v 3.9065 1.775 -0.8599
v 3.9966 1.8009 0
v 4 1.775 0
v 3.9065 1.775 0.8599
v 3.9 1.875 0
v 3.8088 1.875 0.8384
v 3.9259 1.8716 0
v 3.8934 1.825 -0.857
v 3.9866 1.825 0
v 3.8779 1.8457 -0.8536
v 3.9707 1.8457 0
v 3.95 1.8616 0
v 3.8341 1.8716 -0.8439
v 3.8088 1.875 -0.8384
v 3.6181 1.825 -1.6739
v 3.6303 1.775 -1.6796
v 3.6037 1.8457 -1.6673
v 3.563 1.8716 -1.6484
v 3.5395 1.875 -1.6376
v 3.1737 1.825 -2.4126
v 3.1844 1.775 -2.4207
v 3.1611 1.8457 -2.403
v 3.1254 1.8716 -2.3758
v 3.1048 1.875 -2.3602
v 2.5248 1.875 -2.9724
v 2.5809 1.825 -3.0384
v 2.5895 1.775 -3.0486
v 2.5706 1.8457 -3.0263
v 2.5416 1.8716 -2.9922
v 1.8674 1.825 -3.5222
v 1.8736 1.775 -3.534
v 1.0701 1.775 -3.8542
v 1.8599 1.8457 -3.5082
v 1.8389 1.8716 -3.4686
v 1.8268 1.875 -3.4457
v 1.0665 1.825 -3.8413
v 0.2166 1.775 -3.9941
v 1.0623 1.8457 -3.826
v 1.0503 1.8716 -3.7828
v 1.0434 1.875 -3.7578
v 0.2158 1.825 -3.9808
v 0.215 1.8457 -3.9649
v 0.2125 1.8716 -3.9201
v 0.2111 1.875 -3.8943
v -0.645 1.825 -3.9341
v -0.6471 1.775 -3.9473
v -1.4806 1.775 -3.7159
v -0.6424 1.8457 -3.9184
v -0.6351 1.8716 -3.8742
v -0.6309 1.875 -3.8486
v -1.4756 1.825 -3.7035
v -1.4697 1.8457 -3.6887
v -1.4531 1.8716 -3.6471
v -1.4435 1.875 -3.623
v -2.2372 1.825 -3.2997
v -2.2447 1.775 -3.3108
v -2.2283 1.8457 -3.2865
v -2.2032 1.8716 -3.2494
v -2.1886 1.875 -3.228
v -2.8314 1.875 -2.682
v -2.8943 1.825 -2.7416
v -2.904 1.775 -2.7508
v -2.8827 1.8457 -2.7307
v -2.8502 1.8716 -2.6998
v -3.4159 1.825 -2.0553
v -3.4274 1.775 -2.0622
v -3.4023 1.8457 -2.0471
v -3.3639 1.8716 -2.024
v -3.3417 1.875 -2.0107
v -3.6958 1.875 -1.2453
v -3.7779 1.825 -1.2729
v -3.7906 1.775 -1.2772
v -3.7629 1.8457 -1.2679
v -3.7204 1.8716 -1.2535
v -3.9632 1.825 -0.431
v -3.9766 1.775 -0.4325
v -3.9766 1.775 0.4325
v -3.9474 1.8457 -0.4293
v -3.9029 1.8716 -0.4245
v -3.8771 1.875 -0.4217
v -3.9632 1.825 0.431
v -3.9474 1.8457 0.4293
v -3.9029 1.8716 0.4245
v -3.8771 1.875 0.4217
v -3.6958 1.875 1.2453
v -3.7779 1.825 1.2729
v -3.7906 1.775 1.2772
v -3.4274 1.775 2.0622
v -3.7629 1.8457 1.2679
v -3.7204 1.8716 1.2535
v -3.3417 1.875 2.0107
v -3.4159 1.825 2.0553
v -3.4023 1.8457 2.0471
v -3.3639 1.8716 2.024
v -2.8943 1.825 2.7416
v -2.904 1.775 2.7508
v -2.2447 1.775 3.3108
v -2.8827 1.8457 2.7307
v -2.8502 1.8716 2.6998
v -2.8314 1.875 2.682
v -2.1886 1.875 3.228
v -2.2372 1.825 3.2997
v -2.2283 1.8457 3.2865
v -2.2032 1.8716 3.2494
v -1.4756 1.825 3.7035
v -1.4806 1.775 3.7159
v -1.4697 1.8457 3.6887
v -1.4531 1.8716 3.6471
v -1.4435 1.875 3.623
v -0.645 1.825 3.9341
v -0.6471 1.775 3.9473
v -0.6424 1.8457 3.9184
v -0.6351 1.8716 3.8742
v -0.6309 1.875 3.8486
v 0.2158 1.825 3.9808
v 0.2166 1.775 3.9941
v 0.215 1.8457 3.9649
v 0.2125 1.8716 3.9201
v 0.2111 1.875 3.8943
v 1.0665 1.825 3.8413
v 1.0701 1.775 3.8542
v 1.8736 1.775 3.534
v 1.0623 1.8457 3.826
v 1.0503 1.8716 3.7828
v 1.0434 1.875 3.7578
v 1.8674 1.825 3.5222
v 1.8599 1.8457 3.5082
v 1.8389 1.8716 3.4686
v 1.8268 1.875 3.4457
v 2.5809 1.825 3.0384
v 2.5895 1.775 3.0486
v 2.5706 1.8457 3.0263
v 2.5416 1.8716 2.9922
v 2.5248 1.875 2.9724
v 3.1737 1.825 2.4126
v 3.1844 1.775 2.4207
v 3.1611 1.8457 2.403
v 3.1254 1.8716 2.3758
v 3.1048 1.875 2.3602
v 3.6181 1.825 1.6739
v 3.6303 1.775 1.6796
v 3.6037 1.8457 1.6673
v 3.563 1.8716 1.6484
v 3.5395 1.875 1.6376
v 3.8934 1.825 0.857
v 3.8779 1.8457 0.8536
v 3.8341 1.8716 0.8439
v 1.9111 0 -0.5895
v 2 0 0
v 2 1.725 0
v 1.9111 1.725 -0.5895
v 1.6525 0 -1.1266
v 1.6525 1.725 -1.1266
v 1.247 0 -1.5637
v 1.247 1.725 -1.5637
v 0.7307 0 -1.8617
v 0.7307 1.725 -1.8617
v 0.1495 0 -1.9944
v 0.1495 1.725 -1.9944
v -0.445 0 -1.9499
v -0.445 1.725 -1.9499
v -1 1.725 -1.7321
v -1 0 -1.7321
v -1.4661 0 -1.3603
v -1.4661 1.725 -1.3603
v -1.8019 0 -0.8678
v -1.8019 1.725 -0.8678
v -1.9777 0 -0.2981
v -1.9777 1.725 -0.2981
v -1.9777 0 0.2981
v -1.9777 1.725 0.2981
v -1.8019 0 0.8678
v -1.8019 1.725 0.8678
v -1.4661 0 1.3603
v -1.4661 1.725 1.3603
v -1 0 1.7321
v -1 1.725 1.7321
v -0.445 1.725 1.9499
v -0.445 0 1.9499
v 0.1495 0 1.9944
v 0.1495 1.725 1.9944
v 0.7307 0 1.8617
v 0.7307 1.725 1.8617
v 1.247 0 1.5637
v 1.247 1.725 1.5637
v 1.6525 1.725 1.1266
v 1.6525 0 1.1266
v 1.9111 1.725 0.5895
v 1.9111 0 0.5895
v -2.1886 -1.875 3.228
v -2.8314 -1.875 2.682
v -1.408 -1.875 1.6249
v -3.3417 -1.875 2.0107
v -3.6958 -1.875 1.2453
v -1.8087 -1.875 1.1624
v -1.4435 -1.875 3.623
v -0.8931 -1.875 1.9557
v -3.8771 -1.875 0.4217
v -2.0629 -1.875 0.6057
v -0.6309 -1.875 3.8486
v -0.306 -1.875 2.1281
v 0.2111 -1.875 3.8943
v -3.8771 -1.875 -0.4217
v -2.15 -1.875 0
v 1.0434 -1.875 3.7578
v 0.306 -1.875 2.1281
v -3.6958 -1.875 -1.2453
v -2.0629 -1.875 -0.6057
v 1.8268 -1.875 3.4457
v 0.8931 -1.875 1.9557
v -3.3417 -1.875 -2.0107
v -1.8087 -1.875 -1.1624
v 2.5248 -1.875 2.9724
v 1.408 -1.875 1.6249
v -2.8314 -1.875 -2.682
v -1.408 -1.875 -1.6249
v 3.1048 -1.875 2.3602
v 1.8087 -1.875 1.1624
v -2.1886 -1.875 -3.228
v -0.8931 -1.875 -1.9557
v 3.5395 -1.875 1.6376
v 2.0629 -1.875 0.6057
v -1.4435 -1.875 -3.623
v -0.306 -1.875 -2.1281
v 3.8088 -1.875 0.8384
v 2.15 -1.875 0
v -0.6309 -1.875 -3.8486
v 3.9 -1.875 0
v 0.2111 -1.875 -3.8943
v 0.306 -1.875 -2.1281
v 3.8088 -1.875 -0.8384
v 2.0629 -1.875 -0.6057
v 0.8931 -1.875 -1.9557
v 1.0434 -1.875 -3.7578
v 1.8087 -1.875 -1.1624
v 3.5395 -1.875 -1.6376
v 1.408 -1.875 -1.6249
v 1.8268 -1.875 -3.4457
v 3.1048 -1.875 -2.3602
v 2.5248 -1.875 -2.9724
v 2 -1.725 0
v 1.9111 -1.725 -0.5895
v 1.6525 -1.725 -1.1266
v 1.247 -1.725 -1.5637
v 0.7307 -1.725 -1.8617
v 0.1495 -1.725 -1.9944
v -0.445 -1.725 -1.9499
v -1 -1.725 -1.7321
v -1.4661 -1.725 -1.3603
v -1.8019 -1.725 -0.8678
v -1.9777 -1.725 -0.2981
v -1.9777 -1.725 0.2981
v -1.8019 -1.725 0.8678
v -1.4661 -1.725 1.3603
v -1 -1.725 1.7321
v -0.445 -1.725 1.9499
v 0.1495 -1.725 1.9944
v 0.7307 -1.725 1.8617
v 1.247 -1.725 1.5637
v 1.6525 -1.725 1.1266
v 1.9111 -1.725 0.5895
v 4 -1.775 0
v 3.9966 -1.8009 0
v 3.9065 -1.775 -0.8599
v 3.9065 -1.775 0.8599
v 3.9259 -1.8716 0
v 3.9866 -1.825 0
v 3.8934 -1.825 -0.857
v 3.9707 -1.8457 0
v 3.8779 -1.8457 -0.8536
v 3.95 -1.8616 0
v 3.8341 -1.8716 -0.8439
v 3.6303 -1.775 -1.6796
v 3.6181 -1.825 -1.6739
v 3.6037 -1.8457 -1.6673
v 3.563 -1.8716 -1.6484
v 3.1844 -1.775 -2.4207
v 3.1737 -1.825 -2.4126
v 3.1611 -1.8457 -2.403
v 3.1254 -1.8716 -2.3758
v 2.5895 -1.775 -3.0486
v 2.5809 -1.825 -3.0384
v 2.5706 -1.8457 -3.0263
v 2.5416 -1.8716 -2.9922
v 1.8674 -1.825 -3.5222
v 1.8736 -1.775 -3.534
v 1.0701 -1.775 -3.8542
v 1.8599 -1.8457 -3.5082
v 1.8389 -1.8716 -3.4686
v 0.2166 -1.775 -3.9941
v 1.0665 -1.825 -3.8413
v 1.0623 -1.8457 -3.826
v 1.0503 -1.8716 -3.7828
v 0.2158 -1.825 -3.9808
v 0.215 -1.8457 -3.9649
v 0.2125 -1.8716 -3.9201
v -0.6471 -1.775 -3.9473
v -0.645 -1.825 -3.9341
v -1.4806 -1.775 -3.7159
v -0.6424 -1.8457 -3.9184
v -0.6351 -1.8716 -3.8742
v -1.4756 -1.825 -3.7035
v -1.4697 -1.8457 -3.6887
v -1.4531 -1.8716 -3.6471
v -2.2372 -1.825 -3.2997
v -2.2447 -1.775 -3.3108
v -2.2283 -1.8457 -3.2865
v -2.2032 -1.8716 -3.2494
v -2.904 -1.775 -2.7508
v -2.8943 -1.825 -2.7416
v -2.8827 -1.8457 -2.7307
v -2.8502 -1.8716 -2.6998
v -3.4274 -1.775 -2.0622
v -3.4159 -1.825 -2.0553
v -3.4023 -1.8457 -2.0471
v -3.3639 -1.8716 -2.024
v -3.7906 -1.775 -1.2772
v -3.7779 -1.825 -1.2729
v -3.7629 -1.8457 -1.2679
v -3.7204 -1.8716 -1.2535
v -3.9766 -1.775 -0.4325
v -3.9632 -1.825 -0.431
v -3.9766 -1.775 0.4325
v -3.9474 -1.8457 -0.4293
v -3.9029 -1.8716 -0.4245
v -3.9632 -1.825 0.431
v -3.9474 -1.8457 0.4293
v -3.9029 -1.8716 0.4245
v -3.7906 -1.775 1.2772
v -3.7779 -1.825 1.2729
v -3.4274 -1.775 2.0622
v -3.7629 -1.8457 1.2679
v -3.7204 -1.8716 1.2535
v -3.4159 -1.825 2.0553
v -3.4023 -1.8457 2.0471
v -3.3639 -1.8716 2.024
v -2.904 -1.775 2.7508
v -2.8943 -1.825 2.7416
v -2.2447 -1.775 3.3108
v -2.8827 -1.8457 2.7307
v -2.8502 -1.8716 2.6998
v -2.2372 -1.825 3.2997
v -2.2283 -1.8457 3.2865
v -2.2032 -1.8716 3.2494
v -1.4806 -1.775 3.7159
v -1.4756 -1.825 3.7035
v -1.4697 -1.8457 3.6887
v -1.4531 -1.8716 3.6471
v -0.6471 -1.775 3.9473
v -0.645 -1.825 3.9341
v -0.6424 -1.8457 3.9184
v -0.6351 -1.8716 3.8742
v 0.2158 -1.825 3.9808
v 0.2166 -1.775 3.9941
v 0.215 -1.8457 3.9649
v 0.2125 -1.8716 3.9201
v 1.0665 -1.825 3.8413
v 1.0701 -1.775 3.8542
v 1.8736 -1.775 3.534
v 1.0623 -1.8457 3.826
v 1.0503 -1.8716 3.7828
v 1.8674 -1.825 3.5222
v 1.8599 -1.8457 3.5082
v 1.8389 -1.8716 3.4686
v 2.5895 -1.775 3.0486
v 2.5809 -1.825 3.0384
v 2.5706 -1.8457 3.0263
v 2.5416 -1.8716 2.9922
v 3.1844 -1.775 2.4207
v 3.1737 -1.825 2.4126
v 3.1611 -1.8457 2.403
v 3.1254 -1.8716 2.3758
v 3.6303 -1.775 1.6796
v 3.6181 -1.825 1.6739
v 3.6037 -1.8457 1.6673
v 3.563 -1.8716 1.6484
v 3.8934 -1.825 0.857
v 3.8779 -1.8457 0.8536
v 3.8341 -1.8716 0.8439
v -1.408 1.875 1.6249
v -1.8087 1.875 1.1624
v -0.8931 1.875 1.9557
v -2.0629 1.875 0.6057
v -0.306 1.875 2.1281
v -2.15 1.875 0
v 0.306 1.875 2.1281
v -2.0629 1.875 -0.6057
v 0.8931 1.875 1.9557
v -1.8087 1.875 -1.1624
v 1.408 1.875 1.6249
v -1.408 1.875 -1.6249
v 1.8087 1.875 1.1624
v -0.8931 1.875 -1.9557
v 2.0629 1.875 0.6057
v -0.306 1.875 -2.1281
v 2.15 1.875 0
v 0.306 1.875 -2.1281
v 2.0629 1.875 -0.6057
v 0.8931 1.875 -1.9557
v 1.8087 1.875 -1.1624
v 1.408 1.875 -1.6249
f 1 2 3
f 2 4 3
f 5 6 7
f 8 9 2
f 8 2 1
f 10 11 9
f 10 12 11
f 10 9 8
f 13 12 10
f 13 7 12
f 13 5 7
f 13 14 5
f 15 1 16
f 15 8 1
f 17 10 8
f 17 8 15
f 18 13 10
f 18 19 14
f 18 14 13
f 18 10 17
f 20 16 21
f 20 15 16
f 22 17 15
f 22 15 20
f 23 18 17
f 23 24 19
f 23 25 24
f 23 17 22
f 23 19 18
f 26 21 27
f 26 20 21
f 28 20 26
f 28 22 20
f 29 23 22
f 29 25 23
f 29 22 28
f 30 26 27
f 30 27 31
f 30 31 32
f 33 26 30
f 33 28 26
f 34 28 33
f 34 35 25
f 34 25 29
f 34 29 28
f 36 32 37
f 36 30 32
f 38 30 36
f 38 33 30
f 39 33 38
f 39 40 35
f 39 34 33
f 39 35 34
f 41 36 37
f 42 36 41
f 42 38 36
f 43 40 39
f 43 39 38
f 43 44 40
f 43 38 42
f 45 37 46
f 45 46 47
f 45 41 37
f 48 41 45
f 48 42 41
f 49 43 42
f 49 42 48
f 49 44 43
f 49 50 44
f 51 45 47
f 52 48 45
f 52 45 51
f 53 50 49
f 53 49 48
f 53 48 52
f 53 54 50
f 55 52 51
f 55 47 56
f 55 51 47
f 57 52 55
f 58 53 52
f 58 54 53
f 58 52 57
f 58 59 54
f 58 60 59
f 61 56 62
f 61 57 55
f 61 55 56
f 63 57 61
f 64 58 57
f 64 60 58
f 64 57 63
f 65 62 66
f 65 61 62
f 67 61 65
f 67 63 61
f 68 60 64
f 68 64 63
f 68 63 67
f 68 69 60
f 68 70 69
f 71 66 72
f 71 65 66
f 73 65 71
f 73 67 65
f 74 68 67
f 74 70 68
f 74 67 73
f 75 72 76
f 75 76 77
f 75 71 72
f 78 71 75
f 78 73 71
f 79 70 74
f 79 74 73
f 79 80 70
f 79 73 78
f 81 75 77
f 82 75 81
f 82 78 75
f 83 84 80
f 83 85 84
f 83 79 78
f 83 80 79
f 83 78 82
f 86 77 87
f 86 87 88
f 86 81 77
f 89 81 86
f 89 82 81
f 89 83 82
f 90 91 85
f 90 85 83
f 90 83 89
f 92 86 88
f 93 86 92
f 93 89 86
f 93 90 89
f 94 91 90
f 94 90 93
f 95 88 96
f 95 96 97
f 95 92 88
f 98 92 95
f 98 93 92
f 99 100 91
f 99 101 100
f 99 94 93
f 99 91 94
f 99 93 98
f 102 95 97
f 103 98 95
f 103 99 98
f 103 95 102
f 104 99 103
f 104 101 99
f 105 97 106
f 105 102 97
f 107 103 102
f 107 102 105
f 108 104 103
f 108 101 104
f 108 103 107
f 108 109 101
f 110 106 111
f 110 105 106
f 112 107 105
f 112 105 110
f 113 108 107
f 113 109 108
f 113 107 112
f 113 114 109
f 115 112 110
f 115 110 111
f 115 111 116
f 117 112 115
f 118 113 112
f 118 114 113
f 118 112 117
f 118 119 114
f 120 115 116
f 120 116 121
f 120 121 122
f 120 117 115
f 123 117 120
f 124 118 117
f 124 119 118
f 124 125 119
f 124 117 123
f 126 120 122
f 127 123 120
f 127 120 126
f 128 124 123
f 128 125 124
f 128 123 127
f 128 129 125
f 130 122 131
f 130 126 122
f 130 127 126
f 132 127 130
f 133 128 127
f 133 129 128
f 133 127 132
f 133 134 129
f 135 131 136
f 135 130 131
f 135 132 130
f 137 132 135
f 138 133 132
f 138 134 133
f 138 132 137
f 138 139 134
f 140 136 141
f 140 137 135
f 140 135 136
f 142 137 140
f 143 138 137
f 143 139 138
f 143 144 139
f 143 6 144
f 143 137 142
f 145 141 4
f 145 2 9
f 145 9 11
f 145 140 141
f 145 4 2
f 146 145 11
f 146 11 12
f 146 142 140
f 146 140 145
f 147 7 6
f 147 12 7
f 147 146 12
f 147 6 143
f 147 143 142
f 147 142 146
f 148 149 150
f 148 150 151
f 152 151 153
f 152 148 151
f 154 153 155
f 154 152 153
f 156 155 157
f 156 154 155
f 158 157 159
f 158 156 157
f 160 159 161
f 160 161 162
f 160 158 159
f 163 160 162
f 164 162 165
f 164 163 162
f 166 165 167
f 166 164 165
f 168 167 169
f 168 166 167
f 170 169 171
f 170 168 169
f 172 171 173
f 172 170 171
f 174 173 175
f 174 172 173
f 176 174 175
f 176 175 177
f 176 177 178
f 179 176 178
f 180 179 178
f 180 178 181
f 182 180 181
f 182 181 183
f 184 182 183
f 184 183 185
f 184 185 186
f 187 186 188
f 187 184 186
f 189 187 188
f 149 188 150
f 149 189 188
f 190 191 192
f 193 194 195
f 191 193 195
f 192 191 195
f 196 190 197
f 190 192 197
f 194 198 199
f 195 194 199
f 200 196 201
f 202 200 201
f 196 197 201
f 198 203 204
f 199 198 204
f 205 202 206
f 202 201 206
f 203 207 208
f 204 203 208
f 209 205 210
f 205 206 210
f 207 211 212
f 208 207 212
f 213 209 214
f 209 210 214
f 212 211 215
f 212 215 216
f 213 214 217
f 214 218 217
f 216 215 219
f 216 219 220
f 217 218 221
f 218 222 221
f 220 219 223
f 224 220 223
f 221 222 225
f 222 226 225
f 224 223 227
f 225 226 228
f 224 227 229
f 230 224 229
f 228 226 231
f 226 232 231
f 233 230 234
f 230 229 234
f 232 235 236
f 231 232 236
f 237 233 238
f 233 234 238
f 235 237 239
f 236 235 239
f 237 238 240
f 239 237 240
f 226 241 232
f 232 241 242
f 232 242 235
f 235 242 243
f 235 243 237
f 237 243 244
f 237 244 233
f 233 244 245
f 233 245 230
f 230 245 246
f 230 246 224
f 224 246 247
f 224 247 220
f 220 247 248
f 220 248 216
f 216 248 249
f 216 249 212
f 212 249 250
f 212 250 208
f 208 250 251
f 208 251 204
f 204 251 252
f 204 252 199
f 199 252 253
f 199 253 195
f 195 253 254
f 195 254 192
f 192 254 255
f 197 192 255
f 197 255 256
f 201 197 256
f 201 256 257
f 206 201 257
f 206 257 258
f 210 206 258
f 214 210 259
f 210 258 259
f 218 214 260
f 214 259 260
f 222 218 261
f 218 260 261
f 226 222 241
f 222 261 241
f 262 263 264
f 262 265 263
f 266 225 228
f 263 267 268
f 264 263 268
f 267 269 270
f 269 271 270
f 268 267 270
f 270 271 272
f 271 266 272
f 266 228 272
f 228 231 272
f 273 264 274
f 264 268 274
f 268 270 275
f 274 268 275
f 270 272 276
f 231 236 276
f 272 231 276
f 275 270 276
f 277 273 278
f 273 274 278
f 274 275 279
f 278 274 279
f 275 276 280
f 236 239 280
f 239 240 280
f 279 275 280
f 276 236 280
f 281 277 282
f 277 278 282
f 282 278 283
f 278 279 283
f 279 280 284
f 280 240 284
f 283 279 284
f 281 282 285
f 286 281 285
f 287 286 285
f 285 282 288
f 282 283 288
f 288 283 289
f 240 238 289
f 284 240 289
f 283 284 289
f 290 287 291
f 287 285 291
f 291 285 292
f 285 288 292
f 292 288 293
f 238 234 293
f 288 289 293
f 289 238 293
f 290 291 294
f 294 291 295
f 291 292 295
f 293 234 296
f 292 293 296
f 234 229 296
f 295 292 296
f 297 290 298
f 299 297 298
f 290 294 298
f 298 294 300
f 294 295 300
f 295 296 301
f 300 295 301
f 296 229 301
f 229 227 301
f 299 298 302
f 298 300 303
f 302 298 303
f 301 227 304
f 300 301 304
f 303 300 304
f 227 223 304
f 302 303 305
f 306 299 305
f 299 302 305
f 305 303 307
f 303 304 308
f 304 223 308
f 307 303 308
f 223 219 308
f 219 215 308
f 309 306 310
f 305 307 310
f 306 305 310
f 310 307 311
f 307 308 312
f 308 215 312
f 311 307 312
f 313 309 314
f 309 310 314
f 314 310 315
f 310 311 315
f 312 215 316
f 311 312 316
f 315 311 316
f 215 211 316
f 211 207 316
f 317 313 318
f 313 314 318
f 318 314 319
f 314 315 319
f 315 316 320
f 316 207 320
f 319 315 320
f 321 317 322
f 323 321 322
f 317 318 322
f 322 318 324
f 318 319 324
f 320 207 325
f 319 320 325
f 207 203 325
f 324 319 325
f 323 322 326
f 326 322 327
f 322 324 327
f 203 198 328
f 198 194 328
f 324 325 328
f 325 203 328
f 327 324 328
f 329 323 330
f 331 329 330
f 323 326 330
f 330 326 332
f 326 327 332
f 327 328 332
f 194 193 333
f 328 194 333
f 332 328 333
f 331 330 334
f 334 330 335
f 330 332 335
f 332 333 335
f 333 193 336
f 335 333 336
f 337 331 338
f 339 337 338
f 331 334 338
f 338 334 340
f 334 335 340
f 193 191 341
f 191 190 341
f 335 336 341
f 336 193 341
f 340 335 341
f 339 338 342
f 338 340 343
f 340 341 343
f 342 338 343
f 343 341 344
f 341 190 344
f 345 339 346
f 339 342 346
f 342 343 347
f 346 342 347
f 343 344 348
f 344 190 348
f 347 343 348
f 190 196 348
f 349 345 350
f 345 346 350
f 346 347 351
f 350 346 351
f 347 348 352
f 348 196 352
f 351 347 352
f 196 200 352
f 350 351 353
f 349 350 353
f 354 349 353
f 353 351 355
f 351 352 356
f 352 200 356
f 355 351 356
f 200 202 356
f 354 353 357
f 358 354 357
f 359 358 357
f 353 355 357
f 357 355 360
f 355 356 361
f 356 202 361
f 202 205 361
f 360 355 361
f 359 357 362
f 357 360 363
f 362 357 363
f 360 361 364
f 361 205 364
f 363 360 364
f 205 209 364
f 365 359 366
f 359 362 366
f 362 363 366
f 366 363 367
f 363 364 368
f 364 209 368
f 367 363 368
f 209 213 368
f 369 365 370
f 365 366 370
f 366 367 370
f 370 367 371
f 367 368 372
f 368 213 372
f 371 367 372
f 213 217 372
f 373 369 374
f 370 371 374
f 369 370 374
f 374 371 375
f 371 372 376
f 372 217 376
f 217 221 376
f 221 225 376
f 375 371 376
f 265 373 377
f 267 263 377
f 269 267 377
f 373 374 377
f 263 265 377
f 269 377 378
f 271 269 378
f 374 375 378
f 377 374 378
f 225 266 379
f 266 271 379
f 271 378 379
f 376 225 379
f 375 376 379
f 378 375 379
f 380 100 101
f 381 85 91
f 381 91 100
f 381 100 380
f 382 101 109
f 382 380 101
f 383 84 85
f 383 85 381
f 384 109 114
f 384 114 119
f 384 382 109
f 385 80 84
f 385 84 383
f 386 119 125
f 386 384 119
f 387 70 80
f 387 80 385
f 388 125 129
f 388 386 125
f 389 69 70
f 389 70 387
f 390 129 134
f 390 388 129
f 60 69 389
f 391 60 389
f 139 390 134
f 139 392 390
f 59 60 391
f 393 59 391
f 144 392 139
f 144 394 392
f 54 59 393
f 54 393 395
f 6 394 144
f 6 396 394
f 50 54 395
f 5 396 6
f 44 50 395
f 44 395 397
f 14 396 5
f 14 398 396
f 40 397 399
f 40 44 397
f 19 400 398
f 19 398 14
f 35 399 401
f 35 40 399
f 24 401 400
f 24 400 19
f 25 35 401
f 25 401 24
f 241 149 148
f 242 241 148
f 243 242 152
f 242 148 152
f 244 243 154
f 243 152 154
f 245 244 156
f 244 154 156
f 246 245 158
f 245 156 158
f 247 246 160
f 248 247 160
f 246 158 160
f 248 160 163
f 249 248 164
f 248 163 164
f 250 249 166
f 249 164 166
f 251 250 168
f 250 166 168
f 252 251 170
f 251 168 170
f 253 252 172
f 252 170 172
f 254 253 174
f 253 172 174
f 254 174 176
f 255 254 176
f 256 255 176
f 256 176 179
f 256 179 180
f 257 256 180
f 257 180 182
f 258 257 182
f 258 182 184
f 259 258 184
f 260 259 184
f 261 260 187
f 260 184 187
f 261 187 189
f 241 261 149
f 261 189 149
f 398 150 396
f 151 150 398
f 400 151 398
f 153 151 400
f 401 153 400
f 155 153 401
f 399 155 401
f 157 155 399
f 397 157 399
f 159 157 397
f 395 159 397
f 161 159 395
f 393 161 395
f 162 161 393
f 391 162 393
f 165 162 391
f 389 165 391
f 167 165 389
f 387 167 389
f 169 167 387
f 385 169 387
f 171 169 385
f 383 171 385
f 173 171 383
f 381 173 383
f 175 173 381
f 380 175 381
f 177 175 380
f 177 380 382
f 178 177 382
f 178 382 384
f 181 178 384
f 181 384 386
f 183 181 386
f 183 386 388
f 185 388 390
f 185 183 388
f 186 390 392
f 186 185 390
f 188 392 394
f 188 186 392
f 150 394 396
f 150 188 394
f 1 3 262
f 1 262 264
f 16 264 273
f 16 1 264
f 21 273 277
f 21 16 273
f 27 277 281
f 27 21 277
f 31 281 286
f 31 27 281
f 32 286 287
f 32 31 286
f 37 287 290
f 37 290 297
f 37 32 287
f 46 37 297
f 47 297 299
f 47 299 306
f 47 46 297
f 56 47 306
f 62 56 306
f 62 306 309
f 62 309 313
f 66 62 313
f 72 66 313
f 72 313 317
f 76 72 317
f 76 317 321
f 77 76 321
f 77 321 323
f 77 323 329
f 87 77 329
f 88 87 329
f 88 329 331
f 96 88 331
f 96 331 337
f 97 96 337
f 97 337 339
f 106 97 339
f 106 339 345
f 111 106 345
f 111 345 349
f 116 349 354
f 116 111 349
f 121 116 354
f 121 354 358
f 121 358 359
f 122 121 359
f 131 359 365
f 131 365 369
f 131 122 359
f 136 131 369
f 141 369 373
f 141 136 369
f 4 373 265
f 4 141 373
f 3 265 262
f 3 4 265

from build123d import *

# Parameters (mm, degrees)
BOSS_EXTRUDE1_DEPTH      = 1.875
BOSS_EXTRUDE1_DEPTH_BACK = 1.875
SKETCH1_R                = 4
SKETCH1_R_2              = 2
FILLET1_R                = 0.1
CHAMFER4_SIZE            = 0.15


with BuildPart() as part:
    # Sketch1 → Boss-Extrude1 (new, two sides: drawn at the far end of the back side and taken through both)
    with BuildSketch(Plane(origin=(0, 0, 0), x_dir=(1, 0, 0), z_dir=(0, 1, 0)).offset(-BOSS_EXTRUDE1_DEPTH_BACK)):
        Circle(SKETCH1_R)
        Circle(SKETCH1_R_2, mode=Mode.SUBTRACT)
    extrude(amount=BOSS_EXTRUDE1_DEPTH + BOSS_EXTRUDE1_DEPTH_BACK)

    # Fillet1
    fillet1_edges = [part.edges().sort_by_distance(p)[0] for p in [
        (-4, 1.875, 0),
        (-4, -1.875, 0),
    ]]
    fillet(fillet1_edges, radius=FILLET1_R)

    # Chamfer4
    chamfer4_edges = [part.edges().sort_by_distance(p)[0] for p in [
        (-2, -1.875, 0),
        (-2, 1.875, 0),
    ]]
    chamfer(chamfer4_edges, length=CHAMFER4_SIZE)


solid = part.part
